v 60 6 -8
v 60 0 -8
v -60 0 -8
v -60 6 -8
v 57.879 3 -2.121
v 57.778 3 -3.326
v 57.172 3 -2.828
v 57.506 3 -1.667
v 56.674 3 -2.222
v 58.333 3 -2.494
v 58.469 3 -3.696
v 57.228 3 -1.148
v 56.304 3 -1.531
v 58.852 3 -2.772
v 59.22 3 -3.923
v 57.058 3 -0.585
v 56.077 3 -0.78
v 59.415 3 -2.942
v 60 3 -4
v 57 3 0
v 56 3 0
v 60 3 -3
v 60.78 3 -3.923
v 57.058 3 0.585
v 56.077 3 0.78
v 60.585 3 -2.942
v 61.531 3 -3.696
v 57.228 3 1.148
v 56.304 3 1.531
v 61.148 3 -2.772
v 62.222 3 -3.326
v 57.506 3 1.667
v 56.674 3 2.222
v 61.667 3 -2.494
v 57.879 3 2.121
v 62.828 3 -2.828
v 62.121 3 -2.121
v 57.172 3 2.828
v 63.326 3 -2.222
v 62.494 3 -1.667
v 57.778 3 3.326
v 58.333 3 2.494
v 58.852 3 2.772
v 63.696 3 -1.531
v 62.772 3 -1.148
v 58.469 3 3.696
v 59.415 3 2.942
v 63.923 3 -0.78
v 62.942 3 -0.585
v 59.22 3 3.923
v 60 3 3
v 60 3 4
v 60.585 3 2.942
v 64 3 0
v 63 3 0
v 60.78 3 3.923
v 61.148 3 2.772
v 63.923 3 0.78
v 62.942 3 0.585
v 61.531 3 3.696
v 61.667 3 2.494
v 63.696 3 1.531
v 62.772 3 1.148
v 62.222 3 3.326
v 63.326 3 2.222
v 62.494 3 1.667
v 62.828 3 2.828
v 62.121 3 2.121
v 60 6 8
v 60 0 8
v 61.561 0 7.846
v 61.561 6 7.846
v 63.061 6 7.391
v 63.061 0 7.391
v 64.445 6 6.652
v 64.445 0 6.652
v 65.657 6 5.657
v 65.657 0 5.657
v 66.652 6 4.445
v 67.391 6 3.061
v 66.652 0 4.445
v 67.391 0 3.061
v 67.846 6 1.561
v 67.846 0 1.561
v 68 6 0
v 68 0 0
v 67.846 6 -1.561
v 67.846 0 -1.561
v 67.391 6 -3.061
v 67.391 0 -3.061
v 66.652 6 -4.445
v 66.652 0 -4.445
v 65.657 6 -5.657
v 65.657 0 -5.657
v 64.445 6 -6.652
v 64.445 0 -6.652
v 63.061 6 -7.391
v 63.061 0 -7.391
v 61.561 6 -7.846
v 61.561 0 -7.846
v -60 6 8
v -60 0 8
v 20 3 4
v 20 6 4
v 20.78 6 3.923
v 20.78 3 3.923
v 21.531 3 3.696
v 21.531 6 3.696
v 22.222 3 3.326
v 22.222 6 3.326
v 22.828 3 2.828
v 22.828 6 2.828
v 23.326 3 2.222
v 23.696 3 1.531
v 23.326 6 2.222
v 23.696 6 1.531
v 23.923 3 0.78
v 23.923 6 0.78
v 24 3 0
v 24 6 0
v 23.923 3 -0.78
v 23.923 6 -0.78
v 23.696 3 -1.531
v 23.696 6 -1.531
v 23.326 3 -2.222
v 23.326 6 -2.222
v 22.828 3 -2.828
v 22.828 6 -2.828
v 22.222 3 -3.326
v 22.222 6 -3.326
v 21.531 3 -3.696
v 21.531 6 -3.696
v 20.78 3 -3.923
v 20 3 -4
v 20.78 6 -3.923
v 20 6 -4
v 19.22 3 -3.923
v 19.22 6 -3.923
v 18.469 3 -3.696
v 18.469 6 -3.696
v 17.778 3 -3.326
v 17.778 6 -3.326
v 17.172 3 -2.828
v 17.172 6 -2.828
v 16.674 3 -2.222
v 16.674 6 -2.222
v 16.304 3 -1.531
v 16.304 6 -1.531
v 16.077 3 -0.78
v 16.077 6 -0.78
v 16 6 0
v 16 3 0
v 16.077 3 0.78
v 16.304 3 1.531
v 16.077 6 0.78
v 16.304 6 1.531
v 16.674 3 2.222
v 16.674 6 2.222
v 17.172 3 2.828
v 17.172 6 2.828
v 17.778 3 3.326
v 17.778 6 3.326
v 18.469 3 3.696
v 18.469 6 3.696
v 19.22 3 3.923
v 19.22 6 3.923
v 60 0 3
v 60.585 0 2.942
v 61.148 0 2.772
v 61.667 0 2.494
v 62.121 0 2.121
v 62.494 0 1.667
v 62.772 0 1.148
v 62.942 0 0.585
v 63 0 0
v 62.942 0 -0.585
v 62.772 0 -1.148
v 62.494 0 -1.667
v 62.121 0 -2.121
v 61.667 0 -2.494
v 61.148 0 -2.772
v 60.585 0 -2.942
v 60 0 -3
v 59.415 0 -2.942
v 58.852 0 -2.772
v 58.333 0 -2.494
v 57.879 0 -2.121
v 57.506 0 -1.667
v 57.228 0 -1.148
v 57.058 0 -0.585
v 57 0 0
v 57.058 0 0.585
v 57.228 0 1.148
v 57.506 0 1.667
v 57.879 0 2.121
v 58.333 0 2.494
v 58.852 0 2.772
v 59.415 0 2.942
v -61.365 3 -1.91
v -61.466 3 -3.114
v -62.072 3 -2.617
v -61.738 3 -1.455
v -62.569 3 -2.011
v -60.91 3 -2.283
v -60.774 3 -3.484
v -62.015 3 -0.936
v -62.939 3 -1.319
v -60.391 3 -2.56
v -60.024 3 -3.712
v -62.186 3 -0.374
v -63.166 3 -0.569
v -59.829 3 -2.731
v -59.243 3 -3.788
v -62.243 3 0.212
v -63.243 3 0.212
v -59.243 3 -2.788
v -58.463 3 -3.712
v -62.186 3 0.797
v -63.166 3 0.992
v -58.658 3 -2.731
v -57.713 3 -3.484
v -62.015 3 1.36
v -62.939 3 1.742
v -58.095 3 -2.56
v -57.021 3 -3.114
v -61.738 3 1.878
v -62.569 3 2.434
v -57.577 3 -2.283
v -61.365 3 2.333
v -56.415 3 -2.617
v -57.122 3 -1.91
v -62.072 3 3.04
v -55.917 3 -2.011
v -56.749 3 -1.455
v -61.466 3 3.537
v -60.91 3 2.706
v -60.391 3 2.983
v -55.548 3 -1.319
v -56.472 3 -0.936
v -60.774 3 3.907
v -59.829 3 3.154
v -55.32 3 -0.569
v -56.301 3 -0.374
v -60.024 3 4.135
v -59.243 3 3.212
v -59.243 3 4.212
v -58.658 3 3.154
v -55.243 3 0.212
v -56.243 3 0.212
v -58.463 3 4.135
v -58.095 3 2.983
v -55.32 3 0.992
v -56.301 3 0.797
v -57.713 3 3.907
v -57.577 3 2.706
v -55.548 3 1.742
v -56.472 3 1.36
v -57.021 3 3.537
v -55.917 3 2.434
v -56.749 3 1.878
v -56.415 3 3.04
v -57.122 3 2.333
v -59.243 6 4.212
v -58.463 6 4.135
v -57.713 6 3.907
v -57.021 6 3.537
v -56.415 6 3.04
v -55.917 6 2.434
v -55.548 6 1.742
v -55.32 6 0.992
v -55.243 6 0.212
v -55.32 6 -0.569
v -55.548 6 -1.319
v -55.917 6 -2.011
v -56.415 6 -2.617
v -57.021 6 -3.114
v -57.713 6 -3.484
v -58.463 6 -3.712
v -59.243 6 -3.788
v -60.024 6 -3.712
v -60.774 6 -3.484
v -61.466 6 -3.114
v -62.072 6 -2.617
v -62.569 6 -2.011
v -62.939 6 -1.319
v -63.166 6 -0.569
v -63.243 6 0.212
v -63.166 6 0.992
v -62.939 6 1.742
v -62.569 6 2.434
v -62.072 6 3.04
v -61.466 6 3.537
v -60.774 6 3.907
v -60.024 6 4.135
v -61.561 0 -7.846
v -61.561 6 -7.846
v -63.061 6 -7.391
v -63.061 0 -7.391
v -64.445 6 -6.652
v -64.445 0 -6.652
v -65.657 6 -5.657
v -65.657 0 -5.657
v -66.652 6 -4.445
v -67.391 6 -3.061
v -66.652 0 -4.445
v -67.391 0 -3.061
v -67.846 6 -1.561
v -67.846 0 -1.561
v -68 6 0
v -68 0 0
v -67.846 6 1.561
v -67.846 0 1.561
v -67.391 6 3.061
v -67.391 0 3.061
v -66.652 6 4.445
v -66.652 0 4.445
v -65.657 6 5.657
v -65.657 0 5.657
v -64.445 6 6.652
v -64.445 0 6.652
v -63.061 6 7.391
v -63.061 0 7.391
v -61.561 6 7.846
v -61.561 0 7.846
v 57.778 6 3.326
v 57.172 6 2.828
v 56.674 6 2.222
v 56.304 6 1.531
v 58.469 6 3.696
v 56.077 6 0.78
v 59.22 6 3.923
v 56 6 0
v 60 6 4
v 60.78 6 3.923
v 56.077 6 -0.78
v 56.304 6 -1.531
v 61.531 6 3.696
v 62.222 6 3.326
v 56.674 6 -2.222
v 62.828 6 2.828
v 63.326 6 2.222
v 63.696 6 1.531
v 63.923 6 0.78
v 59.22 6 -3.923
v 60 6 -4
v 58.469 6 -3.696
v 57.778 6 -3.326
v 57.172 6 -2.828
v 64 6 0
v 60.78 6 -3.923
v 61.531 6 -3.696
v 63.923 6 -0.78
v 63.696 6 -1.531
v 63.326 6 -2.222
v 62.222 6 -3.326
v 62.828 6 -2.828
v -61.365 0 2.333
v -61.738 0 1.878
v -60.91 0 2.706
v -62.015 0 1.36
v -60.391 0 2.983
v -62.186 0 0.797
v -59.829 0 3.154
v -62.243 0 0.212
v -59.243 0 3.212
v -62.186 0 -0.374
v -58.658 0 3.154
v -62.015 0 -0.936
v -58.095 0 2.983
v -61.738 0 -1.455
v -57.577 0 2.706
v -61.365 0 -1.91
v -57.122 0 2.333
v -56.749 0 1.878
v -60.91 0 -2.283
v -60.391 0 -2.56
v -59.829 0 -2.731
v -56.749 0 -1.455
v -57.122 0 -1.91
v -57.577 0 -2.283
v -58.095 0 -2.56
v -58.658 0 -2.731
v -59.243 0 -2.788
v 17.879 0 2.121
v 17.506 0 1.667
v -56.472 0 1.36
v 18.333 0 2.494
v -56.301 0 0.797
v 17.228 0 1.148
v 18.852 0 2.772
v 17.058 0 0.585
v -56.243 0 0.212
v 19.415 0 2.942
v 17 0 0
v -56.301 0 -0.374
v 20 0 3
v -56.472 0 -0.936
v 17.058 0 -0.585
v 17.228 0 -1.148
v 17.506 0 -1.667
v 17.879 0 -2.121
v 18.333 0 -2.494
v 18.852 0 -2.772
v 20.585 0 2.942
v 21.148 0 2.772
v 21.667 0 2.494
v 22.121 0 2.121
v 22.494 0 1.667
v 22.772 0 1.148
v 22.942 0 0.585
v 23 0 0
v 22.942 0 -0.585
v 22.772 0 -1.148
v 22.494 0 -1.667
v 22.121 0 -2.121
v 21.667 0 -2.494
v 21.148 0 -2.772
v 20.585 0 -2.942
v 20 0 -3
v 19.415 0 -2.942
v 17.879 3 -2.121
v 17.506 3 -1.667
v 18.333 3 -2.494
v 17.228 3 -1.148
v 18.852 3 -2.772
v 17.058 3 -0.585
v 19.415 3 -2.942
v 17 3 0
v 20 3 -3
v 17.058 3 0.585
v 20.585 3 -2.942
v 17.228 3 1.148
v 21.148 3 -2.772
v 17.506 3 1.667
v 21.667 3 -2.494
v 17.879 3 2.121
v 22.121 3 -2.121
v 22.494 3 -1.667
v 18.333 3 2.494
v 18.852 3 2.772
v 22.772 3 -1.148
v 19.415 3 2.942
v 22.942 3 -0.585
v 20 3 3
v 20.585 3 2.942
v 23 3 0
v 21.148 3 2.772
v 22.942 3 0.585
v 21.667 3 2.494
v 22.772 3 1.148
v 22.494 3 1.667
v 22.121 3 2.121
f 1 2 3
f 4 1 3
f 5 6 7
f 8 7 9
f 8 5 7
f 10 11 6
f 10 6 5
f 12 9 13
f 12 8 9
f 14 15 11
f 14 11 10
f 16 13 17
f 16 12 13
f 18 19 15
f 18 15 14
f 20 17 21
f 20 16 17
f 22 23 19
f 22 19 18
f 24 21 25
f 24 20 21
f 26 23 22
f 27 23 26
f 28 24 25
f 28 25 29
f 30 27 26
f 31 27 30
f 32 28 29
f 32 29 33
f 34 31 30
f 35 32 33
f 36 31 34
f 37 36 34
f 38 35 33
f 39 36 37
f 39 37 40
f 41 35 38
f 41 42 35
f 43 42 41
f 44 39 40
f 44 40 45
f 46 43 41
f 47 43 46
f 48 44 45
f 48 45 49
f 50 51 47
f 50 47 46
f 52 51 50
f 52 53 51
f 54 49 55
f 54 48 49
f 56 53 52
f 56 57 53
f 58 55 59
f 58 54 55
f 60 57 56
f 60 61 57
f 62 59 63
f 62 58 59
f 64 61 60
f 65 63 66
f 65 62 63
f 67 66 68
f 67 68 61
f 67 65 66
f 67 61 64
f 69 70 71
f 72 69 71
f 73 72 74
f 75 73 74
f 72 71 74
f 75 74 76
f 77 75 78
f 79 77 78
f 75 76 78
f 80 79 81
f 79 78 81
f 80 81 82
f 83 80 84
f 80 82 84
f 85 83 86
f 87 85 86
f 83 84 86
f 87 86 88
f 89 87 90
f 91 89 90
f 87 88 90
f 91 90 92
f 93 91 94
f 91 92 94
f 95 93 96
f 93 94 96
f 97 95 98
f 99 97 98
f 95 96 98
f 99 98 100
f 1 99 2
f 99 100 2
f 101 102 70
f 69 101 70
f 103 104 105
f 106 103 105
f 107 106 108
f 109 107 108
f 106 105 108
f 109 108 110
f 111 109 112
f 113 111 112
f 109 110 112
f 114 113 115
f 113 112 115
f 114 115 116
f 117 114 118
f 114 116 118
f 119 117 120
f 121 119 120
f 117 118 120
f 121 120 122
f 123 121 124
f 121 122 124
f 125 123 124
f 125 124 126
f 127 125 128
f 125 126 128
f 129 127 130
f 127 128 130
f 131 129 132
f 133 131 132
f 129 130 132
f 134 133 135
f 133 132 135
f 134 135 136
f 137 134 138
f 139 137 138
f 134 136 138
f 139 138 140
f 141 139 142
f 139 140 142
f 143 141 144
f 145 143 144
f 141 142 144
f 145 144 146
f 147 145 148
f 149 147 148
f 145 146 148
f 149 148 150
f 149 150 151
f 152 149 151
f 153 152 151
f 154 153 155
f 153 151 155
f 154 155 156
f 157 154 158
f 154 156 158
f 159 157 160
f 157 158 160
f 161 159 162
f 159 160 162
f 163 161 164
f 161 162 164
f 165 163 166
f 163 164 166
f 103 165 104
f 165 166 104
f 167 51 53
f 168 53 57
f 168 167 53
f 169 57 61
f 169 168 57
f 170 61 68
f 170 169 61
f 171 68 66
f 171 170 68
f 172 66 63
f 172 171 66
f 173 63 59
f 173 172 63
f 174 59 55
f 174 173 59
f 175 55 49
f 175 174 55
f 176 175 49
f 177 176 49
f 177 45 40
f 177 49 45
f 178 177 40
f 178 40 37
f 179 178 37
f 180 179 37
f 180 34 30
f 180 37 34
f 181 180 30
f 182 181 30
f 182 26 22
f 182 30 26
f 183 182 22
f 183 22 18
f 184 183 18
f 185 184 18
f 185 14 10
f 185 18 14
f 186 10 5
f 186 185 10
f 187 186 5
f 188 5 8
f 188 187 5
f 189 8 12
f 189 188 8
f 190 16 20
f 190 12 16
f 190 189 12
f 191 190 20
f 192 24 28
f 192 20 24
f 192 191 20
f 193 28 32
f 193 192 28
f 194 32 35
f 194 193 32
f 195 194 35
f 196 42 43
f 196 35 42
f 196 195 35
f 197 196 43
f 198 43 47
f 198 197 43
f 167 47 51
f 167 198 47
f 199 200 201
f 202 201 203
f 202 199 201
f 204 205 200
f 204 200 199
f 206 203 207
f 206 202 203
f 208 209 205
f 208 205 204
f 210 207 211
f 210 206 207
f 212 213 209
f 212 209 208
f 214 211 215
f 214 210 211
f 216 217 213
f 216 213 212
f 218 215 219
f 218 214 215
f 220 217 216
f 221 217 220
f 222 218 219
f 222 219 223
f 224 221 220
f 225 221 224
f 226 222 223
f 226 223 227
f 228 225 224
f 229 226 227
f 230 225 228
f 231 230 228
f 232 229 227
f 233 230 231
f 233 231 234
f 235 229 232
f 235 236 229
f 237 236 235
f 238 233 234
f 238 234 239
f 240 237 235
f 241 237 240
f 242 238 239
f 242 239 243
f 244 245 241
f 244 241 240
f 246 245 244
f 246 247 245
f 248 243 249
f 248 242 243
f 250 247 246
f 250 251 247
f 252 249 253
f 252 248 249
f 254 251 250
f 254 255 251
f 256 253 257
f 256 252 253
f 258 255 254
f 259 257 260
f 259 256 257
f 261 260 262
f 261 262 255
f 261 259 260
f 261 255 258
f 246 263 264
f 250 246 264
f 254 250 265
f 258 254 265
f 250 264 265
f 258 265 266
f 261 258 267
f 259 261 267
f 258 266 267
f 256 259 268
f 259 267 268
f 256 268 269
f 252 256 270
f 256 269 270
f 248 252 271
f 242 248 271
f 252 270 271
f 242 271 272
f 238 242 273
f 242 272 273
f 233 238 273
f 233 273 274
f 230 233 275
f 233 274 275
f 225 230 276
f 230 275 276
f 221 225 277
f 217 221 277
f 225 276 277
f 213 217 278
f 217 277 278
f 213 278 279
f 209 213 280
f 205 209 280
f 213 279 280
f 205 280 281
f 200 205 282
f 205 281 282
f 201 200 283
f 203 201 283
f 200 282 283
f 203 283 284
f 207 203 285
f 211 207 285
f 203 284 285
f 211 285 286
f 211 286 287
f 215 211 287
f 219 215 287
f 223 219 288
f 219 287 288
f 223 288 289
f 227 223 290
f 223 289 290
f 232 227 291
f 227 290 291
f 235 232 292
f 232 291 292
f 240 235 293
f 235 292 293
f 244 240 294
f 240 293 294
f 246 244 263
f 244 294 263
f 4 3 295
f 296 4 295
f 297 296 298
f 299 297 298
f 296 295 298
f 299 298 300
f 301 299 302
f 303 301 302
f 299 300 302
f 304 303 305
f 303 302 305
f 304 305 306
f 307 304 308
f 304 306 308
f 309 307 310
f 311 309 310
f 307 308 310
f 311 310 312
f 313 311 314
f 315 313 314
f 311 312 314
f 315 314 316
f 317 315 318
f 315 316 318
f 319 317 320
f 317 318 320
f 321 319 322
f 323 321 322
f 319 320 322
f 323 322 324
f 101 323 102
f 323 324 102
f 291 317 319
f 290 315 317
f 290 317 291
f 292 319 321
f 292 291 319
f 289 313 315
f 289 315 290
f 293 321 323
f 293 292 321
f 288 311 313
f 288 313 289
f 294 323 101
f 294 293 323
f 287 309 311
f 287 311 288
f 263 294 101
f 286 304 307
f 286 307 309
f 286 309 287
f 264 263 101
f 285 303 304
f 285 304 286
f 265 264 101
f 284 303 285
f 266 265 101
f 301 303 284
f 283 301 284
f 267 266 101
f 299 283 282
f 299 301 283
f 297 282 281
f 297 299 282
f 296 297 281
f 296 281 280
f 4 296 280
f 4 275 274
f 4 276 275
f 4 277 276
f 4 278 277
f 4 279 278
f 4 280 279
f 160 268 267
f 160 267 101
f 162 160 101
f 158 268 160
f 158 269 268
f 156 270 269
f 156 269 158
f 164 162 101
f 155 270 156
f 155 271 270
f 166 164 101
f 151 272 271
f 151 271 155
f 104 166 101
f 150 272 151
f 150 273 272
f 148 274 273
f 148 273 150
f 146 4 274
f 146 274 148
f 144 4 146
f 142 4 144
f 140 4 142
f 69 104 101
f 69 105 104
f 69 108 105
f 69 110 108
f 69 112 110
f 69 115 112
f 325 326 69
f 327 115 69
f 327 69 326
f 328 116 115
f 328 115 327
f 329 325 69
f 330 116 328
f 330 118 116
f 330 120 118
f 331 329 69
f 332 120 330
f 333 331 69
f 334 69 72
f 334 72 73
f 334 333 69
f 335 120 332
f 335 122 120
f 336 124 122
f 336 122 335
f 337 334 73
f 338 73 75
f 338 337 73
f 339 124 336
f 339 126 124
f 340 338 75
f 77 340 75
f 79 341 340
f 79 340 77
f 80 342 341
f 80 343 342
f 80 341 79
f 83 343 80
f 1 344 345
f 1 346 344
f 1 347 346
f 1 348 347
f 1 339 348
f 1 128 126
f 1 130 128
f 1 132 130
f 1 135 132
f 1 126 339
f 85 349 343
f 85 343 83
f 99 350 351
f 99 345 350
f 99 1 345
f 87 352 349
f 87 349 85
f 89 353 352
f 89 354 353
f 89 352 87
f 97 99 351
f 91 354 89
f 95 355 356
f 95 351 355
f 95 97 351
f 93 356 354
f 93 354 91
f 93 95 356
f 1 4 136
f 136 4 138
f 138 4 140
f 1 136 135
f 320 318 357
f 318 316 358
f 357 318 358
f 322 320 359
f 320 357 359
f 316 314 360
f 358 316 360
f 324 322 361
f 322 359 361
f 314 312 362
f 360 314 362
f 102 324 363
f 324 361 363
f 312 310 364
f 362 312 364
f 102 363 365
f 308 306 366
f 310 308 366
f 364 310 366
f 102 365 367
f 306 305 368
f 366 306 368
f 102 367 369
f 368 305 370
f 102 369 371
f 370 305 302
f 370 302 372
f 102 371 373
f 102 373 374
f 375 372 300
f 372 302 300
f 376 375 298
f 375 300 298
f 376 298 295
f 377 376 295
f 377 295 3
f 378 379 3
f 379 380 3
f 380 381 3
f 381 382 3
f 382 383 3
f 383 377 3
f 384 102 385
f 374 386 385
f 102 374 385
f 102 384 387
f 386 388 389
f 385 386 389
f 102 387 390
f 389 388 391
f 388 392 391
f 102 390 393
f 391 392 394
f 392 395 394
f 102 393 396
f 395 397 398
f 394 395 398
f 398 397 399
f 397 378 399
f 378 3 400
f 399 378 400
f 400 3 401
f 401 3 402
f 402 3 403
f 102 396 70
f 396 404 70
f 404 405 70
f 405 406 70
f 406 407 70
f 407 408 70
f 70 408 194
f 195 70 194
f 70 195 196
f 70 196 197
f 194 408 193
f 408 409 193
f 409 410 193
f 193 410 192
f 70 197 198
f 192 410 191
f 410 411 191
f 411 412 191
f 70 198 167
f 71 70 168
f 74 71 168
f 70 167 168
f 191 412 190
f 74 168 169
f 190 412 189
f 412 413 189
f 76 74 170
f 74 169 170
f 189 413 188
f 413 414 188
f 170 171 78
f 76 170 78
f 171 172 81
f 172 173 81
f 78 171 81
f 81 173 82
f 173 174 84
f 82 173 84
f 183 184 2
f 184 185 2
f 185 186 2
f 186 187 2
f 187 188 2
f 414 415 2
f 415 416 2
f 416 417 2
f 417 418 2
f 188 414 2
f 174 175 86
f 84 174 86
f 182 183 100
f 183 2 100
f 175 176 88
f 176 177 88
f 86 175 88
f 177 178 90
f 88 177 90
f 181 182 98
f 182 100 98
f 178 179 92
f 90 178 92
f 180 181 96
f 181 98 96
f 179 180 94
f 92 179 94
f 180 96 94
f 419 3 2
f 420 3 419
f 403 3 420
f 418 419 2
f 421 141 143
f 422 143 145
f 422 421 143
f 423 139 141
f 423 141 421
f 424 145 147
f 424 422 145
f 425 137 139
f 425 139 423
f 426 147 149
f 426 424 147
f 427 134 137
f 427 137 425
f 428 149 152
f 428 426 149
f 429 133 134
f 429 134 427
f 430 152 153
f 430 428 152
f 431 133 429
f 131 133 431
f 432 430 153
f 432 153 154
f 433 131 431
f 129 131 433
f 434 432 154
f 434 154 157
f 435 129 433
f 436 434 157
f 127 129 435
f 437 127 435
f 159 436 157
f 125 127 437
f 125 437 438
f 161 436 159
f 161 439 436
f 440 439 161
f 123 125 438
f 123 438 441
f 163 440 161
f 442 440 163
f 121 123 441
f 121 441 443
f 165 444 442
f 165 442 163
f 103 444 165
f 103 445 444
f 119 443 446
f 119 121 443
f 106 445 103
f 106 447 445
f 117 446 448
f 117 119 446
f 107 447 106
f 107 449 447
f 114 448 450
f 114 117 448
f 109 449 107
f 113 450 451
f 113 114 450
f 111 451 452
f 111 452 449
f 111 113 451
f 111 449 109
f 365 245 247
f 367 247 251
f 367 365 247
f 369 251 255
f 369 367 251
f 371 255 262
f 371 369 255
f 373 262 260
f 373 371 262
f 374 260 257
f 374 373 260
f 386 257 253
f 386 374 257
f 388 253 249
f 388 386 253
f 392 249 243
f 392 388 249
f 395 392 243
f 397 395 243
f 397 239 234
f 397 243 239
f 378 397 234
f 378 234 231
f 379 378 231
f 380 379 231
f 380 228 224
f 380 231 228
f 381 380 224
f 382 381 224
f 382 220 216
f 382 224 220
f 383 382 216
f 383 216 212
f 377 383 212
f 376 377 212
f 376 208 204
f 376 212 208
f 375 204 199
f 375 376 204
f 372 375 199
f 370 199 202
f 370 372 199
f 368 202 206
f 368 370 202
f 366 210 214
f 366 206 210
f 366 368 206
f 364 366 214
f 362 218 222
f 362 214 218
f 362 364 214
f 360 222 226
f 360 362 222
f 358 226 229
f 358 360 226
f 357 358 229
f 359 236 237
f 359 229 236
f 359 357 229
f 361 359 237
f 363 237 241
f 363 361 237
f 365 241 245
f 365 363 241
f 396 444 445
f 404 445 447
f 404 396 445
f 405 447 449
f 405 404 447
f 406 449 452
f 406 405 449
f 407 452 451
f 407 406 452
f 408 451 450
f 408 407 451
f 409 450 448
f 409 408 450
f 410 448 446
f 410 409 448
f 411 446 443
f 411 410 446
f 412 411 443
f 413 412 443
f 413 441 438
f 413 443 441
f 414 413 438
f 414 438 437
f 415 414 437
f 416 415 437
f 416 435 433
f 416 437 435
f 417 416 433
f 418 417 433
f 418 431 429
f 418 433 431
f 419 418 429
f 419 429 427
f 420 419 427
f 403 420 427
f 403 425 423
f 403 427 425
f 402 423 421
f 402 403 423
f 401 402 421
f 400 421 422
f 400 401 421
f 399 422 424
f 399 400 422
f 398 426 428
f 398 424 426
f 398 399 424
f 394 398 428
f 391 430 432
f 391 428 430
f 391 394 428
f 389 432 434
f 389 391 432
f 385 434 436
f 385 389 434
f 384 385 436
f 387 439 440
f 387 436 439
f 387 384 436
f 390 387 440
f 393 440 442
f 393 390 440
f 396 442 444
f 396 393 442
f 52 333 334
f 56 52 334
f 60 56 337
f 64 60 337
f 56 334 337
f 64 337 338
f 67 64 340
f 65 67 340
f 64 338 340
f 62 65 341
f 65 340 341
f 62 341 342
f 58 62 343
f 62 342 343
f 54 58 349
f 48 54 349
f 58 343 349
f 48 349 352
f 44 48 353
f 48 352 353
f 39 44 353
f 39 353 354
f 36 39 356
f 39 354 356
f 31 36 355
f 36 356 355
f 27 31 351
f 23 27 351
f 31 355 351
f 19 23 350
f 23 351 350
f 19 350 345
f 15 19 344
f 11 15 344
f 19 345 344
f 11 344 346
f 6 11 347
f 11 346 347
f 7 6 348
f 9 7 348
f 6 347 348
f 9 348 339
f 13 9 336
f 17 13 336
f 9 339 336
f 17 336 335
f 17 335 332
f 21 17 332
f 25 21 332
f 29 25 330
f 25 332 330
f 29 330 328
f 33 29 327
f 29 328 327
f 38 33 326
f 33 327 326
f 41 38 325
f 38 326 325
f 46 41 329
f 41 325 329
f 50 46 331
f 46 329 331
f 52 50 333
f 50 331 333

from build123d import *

# Parameters (mm, degrees)
SKETCH1_R           = 3
BOSS_EXTRUDE1_DEPTH = 6
SKETCH3_R           = 4
CUT_EXTRUDE1_DEPTH  = 3


with BuildPart() as part:
    # Sketch1 → Boss-Extrude1 (new body)
    with BuildSketch(Plane(origin=(0, 0, 0), x_dir=(1, 0, 0), z_dir=(0, 1, 0))):
        with BuildLine():
            Line((-60, -8), (60, -8))
            ThreePointArc((60, -8), (68, 0), (60, 8))
            Line((60, 8), (-60, 8))
            ThreePointArc((-60, 8), (-68, 0), (-60, -8))
        make_face()
        with Locations(Location((-59.243309237, -0.211557176, 0), (0, 0, 270))):
            Circle(SKETCH1_R, mode=Mode.SUBTRACT)
        with Locations(Location((60, 0, 0), (0, 0, 270))):
            Circle(SKETCH1_R, mode=Mode.SUBTRACT)
        with Locations(Location((20, 0, 0), (0, 0, 270))):
            Circle(SKETCH1_R, mode=Mode.SUBTRACT)
    extrude(amount=BOSS_EXTRUDE1_DEPTH)

    # Sketch3 → Cut-Extrude1 (cut)
    with BuildSketch(Plane(origin=(0, 6, 0), x_dir=(1, 0, 0), z_dir=(0, 1, 0))):
        with Locations(Location((-59.243309237, -0.211557176, 0), (0, 0, 270))):
            Circle(SKETCH3_R)
        with Locations(Location((20, 0, 0), (0, 0, 270))):
            Circle(SKETCH3_R)
        with Locations(Location((60, 0, 0), (0, 0, 270))):
            Circle(SKETCH3_R)
    extrude(amount=-CUT_EXTRUDE1_DEPTH, mode=Mode.SUBTRACT)


solid = part.part
